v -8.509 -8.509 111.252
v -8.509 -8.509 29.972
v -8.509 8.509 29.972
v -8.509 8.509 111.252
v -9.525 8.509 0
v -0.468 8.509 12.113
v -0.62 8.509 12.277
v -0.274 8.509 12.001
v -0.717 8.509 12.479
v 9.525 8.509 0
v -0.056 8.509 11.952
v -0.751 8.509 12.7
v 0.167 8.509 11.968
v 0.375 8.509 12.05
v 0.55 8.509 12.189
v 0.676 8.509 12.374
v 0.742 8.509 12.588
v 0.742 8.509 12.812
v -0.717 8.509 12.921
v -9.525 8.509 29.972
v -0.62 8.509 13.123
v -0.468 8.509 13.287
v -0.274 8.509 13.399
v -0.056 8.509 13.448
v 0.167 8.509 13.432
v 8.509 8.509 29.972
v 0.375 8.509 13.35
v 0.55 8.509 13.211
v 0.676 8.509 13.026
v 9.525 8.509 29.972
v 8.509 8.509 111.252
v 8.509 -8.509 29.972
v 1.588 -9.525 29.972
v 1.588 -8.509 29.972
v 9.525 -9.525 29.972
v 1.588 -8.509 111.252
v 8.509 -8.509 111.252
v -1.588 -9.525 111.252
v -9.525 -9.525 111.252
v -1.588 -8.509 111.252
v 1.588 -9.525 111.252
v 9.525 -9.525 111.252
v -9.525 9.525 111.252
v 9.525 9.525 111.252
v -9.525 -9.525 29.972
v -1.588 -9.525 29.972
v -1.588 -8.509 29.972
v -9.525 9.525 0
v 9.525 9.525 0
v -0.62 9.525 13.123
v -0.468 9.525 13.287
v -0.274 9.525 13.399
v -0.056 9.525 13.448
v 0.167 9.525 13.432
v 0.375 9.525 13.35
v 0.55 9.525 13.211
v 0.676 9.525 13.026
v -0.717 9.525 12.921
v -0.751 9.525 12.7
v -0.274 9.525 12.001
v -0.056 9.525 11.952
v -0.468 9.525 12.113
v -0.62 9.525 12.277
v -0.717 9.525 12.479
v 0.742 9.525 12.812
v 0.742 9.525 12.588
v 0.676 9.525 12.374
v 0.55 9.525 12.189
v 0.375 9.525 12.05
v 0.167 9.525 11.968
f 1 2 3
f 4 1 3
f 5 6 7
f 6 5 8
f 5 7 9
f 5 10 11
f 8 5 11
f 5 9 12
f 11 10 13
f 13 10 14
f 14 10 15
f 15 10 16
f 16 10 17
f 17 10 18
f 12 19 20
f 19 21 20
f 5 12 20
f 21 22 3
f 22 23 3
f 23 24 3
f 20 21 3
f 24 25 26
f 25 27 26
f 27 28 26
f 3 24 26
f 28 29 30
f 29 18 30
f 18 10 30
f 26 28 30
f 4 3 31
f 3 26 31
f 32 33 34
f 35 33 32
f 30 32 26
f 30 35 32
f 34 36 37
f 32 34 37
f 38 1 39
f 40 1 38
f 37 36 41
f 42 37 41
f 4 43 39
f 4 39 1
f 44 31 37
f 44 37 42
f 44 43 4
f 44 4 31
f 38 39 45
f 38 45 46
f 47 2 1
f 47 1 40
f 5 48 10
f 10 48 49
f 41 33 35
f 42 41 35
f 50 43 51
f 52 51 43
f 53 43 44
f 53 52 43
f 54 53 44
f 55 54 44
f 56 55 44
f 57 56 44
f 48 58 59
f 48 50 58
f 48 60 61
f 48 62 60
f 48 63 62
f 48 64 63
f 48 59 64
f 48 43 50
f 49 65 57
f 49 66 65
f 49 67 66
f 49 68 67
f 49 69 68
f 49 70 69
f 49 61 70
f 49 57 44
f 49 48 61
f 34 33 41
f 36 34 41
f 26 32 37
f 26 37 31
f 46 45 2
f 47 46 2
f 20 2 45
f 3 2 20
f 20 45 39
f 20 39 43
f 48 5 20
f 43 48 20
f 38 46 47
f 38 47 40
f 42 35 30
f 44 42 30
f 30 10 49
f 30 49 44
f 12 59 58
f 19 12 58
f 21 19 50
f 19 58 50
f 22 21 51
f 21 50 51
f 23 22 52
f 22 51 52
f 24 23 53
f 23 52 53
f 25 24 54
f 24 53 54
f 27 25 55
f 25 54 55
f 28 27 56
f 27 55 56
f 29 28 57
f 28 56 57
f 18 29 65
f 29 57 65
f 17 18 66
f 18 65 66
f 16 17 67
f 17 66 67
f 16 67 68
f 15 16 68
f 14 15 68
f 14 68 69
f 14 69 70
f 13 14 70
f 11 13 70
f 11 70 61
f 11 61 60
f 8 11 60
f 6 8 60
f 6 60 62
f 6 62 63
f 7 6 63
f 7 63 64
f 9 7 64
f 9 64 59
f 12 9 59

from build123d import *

# Parameters (mm, degrees)
F0_W     = 19.05
F0_H     = 19.05
F0_W_2   = 17.018
F0_H_2   = 17.018
F1_DEPTH = 111.252
F2_W     = 3.175
F2_H     = 111.252
F3_DEPTH = 1.016
F4_W     = 18.034
F4_H     = 29.972
F5_DEPTH = 19.051
F6_R     = 0.75057
F7_DEPTH = 19.051


with BuildPart() as f1:
    # F0 (on Top) → F1 (new body)
    with BuildSketch(Plane.XY):
        Rectangle(F0_W, F0_H)
        Rectangle(F0_W_2, F0_H_2, mode=Mode.SUBTRACT)
    extrude(amount=F1_DEPTH)

    # F2 (on face) → F3 (cut, through all)
    with BuildSketch(Plane.XZ.offset(9.525)):
        with Locations((0, 55.626)):
            Rectangle(F2_W, F2_H)
    extrude(amount=-F3_DEPTH, mode=Mode.SUBTRACT)

    # F4 (on face) → F5 (cut, through all)
    with BuildSketch(Plane.YZ.offset(9.525)):
        with Locations((-0.508, 14.986)):
            Rectangle(F4_W, F4_H)
    extrude(amount=-F5_DEPTH, mode=Mode.SUBTRACT)

    # F6 (on face) → F7 (cut, through all)
    with BuildSketch(Plane(origin=(0, 9.525, 0), x_dir=(-1, 0, 0), z_dir=(0, 1, 0))):
        with Locations((0, 12.7)):
            Circle(F6_R)
    extrude(amount=-F7_DEPTH, mode=Mode.SUBTRACT)


solid = f1.part
